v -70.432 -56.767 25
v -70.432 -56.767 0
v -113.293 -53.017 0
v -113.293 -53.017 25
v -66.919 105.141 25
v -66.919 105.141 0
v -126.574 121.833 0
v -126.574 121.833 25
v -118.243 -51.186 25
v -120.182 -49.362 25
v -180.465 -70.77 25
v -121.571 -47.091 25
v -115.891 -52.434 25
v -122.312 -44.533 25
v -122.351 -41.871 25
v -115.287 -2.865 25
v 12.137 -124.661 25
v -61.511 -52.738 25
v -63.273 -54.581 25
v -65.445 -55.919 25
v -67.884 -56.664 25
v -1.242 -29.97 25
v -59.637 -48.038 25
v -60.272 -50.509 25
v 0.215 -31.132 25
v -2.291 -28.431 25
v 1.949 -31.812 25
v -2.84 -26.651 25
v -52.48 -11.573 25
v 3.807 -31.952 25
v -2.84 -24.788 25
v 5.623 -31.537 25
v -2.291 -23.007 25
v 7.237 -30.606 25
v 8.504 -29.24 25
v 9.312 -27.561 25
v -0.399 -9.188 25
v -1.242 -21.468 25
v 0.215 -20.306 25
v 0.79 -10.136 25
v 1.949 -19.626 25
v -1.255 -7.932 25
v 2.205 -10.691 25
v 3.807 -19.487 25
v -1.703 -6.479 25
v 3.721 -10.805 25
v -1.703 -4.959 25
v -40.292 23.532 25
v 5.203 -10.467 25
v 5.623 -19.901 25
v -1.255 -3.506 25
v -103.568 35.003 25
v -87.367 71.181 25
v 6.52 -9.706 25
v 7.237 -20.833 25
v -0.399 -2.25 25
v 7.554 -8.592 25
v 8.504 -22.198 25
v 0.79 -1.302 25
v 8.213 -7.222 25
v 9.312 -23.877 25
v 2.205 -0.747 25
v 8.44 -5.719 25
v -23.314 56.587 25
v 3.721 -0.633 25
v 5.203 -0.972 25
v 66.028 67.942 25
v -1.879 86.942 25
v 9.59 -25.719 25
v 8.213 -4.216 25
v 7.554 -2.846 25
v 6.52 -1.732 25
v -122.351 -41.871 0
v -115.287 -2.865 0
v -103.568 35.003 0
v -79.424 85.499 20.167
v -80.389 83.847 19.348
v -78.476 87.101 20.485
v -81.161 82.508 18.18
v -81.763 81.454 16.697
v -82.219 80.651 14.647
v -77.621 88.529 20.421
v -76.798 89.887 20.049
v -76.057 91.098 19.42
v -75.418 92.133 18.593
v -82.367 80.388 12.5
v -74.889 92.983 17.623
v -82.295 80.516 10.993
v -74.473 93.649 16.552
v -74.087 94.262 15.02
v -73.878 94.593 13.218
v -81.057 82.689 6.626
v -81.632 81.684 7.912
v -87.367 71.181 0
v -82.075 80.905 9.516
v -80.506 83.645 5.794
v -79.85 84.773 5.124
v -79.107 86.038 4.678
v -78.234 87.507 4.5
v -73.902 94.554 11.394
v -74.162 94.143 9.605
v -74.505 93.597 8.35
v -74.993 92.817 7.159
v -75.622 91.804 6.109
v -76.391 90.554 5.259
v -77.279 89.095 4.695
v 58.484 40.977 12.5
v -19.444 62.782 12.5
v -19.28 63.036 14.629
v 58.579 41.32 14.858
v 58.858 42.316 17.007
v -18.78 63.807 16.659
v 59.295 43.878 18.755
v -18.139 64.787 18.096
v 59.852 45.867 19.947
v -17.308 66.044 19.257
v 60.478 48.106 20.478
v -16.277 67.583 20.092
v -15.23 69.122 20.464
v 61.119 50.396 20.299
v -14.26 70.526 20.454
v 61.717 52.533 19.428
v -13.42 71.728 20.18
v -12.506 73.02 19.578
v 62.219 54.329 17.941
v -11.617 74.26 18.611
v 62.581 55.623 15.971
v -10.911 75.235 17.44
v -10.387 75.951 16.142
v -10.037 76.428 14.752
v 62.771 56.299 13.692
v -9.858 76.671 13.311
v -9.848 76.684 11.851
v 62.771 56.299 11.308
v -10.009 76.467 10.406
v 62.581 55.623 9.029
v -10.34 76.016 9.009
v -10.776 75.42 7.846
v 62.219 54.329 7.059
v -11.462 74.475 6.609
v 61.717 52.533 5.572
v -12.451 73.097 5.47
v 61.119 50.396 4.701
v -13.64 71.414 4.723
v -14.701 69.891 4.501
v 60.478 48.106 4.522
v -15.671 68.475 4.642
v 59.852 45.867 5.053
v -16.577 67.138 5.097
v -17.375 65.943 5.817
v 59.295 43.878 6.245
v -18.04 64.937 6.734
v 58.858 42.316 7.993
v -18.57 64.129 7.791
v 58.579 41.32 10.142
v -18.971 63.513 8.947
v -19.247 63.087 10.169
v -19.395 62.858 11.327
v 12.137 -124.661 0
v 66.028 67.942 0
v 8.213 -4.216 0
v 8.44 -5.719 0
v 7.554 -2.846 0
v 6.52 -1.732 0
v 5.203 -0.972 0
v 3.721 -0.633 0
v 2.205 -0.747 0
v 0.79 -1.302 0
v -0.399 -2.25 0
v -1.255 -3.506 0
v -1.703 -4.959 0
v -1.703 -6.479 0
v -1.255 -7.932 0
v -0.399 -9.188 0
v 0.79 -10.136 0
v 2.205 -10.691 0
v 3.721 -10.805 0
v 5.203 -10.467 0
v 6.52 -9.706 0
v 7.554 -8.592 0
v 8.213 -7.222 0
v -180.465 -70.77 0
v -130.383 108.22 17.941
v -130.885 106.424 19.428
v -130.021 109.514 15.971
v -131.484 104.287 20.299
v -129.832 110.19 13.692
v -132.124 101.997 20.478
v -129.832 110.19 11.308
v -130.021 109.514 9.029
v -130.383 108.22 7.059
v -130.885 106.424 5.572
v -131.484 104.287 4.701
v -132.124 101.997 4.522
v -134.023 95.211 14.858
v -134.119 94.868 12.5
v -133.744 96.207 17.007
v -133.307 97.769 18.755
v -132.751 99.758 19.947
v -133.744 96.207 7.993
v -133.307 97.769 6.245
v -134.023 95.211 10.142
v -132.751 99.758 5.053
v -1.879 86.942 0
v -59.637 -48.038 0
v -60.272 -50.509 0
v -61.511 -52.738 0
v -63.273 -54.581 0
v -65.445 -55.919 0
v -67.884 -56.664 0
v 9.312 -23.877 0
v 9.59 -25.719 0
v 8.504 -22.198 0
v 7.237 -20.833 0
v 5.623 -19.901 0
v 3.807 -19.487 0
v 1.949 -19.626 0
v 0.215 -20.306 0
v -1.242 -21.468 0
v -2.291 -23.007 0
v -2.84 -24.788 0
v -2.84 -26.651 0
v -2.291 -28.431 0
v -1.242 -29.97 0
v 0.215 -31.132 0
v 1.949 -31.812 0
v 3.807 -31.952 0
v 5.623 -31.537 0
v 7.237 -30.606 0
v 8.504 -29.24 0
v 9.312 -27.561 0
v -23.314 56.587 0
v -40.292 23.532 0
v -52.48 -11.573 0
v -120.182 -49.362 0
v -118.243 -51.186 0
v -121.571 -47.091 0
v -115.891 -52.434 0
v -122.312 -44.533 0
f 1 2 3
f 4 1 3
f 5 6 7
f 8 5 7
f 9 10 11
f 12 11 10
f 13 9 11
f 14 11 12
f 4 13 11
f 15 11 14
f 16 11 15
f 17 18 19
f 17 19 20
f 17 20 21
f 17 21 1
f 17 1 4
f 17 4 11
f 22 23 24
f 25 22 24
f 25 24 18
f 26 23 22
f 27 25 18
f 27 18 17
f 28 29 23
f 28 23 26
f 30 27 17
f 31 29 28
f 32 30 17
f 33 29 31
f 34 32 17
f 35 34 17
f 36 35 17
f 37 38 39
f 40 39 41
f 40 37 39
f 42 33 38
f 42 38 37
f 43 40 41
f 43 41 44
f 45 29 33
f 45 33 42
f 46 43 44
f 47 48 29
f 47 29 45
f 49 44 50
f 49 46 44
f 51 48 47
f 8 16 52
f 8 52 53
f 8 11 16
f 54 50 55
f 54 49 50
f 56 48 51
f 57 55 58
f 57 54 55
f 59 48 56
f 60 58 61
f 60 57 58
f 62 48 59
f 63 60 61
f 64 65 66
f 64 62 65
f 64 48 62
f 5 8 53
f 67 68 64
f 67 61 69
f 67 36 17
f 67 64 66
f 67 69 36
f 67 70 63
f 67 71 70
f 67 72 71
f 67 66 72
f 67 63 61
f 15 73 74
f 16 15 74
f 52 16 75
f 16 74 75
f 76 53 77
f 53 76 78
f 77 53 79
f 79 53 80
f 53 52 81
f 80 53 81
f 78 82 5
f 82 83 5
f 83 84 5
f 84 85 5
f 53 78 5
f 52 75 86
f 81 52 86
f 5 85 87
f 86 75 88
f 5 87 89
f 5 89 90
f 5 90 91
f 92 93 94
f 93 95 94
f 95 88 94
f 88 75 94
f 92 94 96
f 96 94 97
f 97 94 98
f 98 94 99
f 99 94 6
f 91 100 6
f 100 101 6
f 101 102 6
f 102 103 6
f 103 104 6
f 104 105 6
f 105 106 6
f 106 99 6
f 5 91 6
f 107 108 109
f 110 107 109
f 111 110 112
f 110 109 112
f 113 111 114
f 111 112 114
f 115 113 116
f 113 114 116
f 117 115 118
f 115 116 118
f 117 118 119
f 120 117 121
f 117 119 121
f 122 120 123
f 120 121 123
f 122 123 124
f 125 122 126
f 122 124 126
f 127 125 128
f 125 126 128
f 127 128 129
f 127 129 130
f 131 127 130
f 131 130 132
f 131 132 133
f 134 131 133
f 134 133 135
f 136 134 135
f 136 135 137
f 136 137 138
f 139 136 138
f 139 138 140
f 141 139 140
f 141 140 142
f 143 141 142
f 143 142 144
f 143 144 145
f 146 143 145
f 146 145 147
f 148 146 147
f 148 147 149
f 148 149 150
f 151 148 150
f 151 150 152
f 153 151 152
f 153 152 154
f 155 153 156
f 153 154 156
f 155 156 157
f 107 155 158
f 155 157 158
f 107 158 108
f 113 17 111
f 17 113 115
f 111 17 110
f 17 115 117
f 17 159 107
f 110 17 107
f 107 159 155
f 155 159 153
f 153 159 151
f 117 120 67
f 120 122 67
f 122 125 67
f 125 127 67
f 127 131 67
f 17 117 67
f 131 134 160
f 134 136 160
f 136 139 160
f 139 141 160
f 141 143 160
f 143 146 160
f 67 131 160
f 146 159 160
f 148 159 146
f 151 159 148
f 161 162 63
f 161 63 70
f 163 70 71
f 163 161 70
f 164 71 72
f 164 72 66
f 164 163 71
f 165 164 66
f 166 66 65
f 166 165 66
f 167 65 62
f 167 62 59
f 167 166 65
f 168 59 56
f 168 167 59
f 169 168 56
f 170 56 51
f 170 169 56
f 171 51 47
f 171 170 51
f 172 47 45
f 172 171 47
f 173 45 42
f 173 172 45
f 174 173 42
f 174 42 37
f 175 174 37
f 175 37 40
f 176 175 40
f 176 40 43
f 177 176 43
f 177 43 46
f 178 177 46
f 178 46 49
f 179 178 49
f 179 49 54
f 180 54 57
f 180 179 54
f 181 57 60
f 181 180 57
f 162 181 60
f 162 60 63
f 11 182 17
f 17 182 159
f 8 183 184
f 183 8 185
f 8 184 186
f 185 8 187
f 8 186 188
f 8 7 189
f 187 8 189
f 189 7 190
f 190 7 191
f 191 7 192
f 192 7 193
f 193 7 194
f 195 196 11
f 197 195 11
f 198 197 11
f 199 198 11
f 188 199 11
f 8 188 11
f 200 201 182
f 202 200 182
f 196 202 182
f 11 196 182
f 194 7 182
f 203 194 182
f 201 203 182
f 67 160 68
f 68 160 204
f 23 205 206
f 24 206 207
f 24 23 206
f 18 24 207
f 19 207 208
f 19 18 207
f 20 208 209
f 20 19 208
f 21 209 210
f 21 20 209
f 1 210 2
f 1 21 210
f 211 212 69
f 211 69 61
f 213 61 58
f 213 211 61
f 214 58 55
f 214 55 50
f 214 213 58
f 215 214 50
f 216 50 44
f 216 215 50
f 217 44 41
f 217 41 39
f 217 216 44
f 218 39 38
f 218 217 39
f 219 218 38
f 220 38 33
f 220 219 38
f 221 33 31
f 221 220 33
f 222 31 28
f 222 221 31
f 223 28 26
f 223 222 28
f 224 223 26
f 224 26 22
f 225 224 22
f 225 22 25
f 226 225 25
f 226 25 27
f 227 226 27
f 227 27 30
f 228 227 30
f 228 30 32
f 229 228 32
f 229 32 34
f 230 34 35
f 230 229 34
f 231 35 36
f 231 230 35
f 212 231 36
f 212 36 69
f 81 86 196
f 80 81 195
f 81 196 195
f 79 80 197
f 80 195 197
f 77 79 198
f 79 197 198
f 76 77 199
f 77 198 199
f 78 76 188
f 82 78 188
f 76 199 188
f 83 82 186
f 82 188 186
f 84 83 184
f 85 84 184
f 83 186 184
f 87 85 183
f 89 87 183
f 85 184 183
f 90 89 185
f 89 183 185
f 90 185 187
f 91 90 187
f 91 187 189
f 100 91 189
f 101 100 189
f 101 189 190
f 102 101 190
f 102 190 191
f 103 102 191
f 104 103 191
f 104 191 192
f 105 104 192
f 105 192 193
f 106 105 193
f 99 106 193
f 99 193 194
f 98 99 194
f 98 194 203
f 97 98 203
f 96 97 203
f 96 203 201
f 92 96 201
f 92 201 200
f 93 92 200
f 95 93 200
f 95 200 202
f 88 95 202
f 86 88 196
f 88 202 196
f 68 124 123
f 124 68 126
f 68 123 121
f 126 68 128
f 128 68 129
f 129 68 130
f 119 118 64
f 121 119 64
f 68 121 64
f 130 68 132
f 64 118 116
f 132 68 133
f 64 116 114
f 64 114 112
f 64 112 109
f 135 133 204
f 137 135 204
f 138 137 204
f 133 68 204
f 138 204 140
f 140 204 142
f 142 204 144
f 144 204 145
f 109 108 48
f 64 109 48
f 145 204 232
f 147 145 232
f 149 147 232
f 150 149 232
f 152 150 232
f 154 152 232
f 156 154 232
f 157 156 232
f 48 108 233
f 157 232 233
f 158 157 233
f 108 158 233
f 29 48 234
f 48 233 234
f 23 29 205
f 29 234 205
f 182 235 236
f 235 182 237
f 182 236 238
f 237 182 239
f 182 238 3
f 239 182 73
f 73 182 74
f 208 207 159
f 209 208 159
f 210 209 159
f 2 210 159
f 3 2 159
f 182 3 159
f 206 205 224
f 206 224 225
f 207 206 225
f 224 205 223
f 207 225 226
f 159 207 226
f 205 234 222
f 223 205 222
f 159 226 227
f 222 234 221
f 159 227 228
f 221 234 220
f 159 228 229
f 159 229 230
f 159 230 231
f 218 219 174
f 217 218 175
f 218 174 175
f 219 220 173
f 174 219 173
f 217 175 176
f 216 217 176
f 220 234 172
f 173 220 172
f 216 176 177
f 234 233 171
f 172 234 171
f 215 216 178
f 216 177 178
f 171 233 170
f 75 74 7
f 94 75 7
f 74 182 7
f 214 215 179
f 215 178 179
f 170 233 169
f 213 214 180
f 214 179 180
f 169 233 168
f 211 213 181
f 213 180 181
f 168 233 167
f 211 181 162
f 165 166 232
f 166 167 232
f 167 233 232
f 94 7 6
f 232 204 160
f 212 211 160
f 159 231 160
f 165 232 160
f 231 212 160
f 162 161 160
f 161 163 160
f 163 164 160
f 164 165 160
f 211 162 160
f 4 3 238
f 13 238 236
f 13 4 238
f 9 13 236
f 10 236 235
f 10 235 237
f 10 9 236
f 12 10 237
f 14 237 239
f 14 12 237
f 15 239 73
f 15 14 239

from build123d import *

# Parameters (mm, degrees)
F0_R     = 6.25
F0_R_2   = 5.1
F1_DEPTH = 25
F2_R     = 10
F3_R     = 8
F4_DEPTH = 200


# Not quite as in the source:
# - a feature names something its author has since deleted; it is built from what else it names


with BuildPart() as f1:
    # F0 (on Top) → F1 (new body)
    with BuildSketch(Plane.XY):
        with BuildLine():
            ThreePointArc((-1.8786394122, 86.9422913227), (-42.1479963116, 19.0841411618), (-60.6516929848, -57.622852377))
            Line((-60.6516929848, -57.622852377), (-123.4119589646, -52.1320405839))
            ThreePointArc((-123.4119589646, -52.1320405839), (-105.3496683323, 30.162565727), (-66.9193045914, 105.1409340308))
            Line((-66.9193045914, 105.1409340308), (-126.574214908, 121.8326206187))
            Line((-126.574214908, 121.8326206187), (-180.4652056167, -70.7699783265))
            Line((-180.4652056167, -70.7699783265), (12.1373933285, -124.6609690352))
            Line((12.1373933285, -124.6609690352), (66.0283840372, 67.9416299099))
            Line((66.0283840372, 67.9416299099), (-1.8786394122, 86.9422913227))
        make_face()
        with Locations((3.3399020095, -25.7191242051)):
            Circle(F0_R, mode=Mode.SUBTRACT)
        with Locations((3.3399020095, -5.7191242051)):
            Circle(F0_R_2, mode=Mode.SUBTRACT)
    extrude(amount=F1_DEPTH)

    # F2
    f2_edges = [f1.edges().sort_by_distance(p)[0] for p in [
        (-123.411959, -52.132041, 12.5),
        (-60.651693, -57.622852, 12.5),
    ]]
    fillet(f2_edges, radius=F2_R)

    # F3 (on face) → F4 (cut, through all)
    with BuildSketch(Plane(origin=(-148.998349815, 41.6903444163, 0), x_dir=(-0.2694549535, -0.9630129947, 0), z_dir=(-0.9630129947, 0.2694549535, 0))):
        with Locations((-63.2203476394, 12.5)):
            Circle(F3_R)
    extrude(amount=-F4_DEPTH, mode=Mode.SUBTRACT)


solid = f1.part
